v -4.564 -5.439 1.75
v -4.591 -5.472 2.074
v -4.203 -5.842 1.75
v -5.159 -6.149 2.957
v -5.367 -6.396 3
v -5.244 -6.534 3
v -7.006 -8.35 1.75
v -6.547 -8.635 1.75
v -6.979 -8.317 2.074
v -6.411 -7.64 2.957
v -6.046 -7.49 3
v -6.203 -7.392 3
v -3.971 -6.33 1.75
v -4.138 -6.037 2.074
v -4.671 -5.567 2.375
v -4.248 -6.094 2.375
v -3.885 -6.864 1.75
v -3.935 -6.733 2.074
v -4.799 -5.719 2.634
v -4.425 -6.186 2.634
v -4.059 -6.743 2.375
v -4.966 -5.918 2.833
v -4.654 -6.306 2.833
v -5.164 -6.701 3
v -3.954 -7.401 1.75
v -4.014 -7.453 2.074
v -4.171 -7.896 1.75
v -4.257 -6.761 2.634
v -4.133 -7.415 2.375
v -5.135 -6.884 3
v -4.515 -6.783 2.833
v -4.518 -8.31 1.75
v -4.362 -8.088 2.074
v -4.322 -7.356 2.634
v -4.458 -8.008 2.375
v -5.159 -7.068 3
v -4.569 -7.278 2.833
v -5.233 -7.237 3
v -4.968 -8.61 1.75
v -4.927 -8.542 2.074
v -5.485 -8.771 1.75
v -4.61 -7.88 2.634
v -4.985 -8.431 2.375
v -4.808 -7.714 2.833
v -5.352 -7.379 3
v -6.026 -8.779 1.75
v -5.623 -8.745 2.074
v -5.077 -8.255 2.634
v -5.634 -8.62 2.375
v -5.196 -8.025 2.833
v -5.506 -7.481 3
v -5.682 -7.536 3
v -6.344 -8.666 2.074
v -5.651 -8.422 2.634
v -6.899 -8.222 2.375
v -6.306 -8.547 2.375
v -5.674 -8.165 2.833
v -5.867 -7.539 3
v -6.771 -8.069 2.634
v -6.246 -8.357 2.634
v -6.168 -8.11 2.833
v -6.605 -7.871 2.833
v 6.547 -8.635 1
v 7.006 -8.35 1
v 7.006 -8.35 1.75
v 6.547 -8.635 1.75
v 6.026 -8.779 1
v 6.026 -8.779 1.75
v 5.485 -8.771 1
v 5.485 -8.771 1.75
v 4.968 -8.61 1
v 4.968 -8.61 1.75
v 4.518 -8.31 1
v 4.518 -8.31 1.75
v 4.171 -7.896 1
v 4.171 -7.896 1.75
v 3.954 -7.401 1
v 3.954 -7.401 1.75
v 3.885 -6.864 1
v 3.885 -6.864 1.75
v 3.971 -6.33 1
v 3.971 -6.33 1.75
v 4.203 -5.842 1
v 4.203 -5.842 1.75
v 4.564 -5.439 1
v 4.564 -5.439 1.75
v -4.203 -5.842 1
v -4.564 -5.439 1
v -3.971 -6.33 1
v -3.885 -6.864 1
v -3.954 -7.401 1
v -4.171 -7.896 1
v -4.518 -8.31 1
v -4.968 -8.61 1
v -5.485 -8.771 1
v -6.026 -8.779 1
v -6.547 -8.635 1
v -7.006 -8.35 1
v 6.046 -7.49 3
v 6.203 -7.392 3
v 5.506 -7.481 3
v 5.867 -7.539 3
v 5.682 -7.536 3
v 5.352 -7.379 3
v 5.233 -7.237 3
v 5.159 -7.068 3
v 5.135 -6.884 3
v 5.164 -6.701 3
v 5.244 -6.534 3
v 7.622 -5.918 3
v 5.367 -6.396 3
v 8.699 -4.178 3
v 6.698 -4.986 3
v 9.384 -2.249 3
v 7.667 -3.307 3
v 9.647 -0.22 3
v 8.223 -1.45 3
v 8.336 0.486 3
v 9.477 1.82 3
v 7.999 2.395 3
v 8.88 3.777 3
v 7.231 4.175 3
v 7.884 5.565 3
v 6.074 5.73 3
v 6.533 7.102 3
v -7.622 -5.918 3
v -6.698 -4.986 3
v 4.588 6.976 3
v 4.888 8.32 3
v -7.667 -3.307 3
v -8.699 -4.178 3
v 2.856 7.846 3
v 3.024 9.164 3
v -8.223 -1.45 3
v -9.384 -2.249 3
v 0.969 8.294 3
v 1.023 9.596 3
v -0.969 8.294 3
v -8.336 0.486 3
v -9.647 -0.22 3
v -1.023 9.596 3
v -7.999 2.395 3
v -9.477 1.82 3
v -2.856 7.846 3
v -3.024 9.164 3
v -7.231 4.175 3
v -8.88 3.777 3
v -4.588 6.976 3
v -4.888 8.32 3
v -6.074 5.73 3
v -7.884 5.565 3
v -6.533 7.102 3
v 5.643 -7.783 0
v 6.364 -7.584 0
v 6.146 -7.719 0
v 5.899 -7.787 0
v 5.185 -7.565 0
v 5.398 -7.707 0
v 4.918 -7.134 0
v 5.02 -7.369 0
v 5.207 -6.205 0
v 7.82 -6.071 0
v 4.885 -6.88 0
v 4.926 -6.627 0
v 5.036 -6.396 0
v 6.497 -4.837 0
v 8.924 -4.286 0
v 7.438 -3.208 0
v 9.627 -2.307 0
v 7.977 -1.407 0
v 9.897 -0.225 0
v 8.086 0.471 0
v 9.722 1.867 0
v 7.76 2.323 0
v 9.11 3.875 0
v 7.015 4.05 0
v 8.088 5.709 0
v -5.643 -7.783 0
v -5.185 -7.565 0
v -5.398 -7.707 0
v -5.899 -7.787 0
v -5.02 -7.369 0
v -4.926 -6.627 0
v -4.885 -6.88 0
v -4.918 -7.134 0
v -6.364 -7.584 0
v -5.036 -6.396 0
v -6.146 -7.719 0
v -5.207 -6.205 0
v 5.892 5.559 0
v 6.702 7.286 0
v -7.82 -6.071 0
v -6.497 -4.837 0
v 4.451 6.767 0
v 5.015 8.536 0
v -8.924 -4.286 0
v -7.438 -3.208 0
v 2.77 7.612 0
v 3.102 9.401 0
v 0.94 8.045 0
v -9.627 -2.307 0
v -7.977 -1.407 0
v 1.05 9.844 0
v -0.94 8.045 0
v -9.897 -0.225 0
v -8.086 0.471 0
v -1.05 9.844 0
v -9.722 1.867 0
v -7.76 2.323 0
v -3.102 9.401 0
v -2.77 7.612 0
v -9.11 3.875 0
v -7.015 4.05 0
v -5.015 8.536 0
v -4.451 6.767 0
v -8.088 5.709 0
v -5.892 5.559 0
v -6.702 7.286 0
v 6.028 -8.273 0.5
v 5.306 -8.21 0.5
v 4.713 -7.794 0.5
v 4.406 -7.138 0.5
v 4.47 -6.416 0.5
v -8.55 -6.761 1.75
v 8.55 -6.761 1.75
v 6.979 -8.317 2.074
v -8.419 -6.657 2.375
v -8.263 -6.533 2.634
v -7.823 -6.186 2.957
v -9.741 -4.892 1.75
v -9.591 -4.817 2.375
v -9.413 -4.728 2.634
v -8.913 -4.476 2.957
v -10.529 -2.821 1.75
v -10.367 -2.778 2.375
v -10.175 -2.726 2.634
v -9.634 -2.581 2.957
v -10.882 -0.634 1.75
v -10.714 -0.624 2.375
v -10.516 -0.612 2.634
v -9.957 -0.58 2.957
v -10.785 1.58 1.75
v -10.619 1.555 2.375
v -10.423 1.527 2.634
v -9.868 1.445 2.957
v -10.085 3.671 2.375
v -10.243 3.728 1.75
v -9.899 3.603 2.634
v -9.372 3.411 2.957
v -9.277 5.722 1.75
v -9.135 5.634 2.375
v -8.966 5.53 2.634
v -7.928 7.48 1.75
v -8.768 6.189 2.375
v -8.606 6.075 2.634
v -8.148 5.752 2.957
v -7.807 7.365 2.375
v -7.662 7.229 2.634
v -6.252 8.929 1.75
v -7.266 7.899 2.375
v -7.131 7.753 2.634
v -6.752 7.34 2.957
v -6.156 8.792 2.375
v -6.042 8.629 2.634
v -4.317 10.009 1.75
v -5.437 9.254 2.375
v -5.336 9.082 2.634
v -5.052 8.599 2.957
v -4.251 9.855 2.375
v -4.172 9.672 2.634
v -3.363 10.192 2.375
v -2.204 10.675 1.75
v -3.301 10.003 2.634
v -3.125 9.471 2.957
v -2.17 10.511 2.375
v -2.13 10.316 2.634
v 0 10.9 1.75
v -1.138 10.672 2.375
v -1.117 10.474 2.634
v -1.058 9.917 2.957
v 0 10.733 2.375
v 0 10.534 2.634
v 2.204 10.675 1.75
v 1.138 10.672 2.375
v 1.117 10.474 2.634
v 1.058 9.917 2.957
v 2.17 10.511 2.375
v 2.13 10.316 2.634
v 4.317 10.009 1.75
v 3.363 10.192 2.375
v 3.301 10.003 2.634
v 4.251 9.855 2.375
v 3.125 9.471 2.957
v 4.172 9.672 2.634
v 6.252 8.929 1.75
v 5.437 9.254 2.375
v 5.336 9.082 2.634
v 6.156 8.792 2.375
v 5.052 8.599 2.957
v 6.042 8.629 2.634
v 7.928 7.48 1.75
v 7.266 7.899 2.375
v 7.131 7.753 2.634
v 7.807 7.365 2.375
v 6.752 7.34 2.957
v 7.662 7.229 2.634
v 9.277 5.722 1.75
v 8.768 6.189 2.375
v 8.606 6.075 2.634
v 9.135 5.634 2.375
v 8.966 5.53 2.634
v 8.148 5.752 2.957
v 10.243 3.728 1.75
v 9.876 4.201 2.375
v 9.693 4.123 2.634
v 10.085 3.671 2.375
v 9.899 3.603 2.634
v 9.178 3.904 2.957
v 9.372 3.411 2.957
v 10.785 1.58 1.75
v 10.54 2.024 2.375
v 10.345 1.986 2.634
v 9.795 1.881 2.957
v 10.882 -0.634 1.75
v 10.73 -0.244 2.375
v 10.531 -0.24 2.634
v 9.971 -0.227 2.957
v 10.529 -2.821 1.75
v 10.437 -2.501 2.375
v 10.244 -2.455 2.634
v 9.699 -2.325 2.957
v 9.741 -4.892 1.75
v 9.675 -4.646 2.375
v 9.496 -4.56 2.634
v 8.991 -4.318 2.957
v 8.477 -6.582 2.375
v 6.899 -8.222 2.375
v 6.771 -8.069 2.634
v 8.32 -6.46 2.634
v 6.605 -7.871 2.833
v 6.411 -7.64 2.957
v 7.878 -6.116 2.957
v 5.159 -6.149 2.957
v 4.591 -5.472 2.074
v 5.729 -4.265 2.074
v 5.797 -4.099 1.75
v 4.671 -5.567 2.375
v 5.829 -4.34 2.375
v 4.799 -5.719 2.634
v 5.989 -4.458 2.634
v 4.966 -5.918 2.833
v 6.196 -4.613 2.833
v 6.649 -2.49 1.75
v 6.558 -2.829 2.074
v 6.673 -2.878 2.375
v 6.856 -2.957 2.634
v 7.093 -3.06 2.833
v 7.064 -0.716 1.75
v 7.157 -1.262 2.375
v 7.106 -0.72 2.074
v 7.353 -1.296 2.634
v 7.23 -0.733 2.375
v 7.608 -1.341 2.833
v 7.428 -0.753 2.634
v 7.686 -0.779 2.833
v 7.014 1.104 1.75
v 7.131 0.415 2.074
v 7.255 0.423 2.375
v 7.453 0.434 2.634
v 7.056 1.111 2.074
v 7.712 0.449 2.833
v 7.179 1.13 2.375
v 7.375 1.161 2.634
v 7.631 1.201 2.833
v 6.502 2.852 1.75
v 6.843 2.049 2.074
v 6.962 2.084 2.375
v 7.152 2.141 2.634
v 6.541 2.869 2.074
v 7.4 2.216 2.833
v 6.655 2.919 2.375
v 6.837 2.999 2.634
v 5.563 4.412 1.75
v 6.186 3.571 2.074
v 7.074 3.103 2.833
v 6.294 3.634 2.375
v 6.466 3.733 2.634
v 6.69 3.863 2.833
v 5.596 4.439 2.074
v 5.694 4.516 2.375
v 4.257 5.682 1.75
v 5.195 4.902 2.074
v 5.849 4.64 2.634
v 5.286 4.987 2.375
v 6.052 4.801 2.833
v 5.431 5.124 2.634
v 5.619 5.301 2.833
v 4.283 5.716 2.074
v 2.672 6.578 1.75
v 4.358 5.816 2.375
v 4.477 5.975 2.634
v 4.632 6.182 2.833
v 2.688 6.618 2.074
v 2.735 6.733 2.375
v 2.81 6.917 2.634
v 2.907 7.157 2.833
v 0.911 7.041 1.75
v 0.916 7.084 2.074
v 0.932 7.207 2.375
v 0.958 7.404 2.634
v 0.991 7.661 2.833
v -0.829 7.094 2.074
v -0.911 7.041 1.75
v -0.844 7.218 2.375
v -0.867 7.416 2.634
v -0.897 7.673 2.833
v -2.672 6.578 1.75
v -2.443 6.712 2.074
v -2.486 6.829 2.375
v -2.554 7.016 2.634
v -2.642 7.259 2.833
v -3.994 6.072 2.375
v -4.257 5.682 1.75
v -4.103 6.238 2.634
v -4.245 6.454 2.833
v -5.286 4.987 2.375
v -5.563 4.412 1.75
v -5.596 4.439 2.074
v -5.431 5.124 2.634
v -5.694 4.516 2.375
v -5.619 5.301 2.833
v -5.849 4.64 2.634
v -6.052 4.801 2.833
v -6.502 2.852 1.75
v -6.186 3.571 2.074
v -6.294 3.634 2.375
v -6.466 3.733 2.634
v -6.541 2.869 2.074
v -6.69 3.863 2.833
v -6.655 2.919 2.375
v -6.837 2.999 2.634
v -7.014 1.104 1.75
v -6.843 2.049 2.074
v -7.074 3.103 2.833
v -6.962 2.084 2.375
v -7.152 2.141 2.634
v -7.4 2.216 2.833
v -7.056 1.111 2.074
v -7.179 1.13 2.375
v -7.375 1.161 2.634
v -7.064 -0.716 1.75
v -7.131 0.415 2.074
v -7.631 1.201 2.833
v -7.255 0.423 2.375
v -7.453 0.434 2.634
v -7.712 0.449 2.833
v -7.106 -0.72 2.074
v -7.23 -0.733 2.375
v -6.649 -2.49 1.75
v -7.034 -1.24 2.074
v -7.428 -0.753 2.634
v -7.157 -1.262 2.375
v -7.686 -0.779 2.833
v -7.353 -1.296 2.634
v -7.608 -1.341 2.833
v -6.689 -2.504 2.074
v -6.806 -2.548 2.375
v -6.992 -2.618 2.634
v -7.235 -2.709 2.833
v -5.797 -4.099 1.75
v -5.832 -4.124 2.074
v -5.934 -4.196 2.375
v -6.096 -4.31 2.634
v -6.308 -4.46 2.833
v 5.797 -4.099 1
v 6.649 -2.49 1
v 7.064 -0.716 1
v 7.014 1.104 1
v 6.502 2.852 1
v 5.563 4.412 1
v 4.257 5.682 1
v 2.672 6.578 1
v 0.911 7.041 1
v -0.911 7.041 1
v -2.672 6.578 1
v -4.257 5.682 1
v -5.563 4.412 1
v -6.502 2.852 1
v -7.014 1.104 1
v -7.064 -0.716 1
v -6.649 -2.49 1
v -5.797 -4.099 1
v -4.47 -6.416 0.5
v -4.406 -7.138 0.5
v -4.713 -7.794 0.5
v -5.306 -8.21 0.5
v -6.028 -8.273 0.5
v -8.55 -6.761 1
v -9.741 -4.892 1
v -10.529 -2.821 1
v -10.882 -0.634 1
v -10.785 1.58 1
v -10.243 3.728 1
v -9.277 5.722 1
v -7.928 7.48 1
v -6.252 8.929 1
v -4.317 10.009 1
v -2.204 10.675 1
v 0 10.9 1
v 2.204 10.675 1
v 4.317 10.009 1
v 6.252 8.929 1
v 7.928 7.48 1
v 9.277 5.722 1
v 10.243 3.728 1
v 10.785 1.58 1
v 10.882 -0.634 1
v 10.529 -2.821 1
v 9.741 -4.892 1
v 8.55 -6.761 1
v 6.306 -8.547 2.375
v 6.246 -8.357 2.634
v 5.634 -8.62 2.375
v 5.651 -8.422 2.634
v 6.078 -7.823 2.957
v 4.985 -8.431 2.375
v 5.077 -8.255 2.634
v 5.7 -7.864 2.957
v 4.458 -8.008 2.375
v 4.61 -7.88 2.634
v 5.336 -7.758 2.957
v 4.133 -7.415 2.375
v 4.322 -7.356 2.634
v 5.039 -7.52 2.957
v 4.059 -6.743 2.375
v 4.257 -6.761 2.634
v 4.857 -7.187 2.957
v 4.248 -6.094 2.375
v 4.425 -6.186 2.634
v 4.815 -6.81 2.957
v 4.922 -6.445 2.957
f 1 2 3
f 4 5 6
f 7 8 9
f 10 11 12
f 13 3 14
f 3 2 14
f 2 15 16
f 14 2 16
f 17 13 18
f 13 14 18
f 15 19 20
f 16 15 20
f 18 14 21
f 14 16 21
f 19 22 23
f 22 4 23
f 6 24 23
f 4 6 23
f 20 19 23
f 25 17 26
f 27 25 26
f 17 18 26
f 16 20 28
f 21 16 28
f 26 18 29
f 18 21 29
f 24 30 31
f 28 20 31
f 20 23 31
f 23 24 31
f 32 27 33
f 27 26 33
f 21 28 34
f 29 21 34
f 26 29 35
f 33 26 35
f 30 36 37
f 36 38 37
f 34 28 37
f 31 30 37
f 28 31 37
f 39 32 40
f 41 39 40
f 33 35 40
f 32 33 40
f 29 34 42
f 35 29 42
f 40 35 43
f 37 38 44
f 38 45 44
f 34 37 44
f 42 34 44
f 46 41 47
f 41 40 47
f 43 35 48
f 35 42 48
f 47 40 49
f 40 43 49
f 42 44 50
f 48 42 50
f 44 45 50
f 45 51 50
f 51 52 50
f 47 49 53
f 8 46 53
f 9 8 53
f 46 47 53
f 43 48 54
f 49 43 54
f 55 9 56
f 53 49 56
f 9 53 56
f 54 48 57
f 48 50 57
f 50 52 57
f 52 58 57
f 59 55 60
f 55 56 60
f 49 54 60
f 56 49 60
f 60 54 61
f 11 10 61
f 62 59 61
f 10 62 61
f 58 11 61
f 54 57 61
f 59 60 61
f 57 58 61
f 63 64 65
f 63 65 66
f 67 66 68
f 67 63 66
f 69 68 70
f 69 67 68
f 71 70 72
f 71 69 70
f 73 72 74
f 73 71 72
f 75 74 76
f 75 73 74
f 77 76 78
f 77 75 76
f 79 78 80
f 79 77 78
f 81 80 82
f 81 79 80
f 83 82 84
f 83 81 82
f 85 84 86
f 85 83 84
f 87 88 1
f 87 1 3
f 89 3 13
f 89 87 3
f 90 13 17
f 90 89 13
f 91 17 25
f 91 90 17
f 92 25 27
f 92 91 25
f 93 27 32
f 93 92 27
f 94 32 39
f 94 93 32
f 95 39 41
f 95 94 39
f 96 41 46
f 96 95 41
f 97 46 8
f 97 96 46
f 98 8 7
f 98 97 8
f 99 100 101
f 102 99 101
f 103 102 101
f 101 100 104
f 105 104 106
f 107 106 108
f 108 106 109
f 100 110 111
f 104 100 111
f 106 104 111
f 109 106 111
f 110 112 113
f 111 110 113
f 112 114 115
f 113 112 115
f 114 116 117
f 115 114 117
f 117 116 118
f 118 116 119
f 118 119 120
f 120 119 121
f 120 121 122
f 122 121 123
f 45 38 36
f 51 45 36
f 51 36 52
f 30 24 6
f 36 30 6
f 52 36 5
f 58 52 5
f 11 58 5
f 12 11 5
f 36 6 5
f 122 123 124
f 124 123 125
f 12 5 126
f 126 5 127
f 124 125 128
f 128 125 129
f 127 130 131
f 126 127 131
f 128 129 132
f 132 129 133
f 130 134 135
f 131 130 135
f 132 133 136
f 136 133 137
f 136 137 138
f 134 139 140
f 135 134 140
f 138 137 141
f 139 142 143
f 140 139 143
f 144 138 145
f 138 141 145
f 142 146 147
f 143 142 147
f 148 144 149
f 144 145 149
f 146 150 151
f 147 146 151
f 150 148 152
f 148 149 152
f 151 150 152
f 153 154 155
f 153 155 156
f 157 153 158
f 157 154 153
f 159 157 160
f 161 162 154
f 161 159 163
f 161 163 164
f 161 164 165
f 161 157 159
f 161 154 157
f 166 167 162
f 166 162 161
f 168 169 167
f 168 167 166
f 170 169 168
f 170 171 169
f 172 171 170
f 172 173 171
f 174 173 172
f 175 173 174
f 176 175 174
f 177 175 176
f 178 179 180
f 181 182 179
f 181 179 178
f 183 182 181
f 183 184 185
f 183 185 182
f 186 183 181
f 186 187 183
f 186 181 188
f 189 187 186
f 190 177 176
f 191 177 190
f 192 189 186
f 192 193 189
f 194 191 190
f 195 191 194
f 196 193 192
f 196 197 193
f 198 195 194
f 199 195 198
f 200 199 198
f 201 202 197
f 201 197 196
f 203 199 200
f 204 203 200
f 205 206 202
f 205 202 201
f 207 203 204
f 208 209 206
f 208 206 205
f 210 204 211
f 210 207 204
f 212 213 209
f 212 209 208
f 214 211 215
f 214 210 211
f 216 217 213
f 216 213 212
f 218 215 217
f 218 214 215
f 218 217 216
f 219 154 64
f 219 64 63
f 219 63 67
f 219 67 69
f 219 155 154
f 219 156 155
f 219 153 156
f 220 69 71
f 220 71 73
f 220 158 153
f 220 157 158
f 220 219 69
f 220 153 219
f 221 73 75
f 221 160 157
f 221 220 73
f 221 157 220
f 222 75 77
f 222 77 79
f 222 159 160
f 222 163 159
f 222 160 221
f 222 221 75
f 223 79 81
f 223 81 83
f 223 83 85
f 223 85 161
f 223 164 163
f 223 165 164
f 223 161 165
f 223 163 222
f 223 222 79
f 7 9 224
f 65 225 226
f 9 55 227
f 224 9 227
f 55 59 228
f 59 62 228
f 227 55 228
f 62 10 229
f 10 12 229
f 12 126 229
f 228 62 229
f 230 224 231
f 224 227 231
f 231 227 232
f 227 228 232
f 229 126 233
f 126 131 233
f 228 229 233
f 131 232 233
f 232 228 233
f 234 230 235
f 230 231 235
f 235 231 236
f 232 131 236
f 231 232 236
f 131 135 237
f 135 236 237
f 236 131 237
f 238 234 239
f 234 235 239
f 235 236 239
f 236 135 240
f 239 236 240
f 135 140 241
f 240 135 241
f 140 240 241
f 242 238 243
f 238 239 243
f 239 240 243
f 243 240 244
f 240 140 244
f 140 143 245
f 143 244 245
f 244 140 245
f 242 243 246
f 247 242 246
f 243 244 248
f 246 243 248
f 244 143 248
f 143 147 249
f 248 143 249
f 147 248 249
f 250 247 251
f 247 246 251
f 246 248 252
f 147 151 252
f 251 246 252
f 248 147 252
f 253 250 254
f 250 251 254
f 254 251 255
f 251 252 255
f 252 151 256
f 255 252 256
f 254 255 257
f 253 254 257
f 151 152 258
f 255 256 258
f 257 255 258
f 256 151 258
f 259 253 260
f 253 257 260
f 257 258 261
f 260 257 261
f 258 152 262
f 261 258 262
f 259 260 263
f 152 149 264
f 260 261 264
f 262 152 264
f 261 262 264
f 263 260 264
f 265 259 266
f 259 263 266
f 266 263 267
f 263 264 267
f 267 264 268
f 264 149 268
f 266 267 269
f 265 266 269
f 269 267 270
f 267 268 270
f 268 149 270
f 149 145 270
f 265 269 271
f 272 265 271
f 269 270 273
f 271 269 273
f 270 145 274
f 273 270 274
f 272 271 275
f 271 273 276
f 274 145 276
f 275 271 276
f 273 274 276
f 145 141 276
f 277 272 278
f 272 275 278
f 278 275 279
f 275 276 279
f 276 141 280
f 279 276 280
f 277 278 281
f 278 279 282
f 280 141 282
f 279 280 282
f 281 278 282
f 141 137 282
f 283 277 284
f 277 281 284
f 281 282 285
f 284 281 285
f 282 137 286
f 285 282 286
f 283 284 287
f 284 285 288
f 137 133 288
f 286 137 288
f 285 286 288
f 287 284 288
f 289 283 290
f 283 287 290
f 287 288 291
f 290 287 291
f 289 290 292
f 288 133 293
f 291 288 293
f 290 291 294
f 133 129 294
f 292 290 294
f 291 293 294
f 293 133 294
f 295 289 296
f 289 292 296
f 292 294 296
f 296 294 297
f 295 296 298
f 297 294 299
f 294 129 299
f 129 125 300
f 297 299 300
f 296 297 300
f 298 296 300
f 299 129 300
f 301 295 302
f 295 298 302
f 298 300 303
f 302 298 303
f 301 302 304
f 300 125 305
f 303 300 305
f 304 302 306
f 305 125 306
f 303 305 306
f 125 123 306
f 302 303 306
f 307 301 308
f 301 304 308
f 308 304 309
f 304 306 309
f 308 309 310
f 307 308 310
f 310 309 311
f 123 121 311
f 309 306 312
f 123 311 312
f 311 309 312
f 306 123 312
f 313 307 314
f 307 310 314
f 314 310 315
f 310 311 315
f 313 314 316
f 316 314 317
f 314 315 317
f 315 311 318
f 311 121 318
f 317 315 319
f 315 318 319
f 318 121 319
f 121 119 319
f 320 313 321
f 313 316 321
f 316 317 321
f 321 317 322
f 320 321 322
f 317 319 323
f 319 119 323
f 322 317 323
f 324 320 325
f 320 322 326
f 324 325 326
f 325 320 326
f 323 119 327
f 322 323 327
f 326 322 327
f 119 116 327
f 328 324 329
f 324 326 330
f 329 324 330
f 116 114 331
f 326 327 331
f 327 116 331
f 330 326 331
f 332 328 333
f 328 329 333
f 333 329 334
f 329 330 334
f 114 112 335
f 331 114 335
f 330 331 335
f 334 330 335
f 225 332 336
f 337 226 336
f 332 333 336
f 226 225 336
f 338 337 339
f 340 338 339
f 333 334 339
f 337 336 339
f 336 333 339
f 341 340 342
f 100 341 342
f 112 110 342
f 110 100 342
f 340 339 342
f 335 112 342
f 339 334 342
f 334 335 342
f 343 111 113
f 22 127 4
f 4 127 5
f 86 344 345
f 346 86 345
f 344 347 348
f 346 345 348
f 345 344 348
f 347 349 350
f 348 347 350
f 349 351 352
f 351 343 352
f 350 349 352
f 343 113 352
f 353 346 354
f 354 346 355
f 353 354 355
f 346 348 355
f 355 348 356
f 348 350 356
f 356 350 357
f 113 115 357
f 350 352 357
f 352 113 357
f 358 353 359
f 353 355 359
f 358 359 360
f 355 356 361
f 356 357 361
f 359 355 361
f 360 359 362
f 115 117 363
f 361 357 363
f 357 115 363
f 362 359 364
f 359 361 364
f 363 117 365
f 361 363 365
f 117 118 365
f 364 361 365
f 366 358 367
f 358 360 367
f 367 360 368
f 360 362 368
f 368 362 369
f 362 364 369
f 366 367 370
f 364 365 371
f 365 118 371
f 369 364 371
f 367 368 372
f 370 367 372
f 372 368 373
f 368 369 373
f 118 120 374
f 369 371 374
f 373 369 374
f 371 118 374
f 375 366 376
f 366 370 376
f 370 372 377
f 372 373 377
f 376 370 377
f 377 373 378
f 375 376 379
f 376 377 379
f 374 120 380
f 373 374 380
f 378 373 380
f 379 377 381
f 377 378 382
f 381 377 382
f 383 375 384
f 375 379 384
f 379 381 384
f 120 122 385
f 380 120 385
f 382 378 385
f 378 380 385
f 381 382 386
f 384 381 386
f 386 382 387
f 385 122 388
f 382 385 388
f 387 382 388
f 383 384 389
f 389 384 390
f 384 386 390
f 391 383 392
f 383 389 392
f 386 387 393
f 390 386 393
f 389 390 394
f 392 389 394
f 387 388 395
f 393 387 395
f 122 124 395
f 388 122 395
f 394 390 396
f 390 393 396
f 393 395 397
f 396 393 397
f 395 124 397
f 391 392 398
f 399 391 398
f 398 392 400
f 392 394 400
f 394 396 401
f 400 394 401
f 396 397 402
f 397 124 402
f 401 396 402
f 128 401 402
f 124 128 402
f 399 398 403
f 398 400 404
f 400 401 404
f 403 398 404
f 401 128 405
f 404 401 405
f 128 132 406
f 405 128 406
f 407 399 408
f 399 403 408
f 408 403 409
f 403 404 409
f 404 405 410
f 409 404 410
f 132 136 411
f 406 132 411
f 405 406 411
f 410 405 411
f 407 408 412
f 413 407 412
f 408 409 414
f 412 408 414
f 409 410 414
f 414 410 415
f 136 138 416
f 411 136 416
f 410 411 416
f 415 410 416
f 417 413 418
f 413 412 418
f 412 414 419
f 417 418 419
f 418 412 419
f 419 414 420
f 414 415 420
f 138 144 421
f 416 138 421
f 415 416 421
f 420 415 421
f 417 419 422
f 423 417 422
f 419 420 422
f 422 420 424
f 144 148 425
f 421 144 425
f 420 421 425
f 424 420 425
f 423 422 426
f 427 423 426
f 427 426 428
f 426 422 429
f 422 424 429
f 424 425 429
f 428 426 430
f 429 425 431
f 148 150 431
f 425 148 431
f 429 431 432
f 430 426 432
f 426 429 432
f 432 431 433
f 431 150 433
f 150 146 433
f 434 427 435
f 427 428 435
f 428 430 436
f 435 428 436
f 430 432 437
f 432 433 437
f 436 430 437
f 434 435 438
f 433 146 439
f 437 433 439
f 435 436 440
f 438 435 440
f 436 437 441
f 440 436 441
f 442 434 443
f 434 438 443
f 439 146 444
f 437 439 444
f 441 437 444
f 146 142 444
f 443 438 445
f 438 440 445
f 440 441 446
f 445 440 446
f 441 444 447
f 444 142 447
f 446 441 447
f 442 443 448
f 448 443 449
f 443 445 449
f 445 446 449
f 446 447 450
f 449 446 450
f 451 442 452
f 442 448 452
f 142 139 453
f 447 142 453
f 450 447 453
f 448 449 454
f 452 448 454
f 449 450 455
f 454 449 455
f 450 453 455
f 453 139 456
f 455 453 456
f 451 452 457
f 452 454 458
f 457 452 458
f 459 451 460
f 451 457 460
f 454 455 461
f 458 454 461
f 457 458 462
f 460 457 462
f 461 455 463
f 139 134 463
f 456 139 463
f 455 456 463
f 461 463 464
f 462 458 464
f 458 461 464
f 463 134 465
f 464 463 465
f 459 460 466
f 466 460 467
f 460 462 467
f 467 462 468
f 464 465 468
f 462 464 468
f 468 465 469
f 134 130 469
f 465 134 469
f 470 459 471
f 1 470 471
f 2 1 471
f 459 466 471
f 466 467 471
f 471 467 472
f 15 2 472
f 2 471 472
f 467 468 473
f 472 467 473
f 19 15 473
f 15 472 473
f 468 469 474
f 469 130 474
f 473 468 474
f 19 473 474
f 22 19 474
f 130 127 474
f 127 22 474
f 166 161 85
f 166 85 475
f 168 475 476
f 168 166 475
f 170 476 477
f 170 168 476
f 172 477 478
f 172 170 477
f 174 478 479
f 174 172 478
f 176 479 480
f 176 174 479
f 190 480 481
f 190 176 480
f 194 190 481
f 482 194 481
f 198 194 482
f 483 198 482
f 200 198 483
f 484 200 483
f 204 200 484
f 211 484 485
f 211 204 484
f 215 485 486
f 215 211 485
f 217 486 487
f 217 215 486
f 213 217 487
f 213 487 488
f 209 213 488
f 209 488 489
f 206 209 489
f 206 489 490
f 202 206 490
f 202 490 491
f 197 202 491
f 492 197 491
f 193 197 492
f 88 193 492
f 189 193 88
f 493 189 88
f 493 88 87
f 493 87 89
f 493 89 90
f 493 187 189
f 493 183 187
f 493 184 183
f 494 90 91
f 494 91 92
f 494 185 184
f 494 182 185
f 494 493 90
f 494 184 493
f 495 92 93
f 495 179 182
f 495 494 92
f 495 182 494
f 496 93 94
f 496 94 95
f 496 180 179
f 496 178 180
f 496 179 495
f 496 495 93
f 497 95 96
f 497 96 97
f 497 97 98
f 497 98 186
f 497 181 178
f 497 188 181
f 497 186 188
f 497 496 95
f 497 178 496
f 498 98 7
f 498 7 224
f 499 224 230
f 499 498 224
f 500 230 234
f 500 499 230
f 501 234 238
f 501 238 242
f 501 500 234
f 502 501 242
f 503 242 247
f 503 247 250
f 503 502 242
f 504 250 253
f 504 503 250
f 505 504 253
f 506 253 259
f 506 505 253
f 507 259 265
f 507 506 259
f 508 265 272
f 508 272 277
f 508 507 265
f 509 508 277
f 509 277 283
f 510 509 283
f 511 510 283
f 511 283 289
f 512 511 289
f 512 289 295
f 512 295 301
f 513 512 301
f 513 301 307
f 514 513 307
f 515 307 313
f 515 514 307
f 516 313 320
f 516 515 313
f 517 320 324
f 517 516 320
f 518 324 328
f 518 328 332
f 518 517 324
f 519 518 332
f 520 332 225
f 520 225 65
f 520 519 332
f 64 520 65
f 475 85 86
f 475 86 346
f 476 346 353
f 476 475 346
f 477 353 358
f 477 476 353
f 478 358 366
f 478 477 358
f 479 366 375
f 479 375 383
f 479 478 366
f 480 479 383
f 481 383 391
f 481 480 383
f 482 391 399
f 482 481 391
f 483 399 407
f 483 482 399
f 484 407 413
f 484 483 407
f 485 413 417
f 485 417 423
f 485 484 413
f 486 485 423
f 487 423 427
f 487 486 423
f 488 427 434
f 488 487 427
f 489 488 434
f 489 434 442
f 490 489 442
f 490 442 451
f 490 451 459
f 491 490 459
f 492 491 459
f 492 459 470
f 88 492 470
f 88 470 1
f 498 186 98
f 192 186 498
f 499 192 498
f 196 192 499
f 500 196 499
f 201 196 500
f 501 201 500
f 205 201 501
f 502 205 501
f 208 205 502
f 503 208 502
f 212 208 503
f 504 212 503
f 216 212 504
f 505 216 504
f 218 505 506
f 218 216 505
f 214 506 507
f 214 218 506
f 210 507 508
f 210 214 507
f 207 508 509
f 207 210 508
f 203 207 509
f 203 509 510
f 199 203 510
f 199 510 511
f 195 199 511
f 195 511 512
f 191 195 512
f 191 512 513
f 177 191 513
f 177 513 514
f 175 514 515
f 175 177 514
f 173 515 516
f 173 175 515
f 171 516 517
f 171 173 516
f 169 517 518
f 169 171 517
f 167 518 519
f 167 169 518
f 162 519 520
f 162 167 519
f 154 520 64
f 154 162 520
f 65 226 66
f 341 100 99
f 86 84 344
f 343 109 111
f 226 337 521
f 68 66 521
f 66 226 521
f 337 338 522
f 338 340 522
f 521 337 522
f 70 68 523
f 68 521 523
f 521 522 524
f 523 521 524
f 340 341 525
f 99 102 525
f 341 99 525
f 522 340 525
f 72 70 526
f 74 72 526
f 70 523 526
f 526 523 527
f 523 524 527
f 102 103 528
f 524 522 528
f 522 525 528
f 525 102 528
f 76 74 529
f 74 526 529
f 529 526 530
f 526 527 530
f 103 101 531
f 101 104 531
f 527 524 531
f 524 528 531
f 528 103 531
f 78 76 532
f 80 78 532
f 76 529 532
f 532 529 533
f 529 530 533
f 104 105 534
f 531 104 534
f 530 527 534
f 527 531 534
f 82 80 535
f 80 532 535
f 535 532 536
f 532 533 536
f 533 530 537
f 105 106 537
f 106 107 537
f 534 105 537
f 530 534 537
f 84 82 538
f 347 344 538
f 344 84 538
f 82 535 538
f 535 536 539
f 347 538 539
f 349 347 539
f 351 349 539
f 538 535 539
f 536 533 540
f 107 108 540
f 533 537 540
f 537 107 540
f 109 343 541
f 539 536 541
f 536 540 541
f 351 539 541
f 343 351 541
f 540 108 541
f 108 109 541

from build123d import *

# Parameters (mm, degrees)
BOSS_EXTRUDE1_DEPTH = 3
CHAMFER1_SIZE       = 1
FILLET1_R           = 1.25


with BuildPart() as part:
    # Sketch1 → Boss-Extrude1 (new body)
    with BuildSketch(Plane.XY):
        with BuildLine():
            ThreePointArc((4.563792029, -5.438915546), (0, 7.1), (-4.563792029, -5.438915546))
            ThreePointArc((-4.563792029, -5.438915546), (-4.329604045, -8.115696446), (-7.006384946, -8.34988443))
            ThreePointArc((-7.006384946, -8.34988443), (0, 10.9), (7.006384946, -8.34988443))
            ThreePointArc((7.006384946, -8.34988443), (4.329604045, -8.115696446), (4.563792029, -5.438915546))
        make_face()
    extrude(amount=BOSS_EXTRUDE1_DEPTH)

    # Chamfer1
    chamfer1_edges = [part.edges().sort_by_distance(p)[0] for p in [
        (0, 10.9, 0),
        (4.329604045, -8.115696446, 0),
        (0, 7.1, 0),
        (-4.329604045, -8.115696446, 0),
    ]]
    chamfer(chamfer1_edges, length=CHAMFER1_SIZE)

    # Fillet1
    fillet1_edges = [part.edges().sort_by_distance(p)[0] for p in [
        (4.329604045, -8.115696446, 3),
        (0, 10.9, 3),
        (-4.329604045, -8.115696446, 3),
        (0, 7.1, 3),
    ]]
    fillet(fillet1_edges, radius=FILLET1_R)


solid = part.part
